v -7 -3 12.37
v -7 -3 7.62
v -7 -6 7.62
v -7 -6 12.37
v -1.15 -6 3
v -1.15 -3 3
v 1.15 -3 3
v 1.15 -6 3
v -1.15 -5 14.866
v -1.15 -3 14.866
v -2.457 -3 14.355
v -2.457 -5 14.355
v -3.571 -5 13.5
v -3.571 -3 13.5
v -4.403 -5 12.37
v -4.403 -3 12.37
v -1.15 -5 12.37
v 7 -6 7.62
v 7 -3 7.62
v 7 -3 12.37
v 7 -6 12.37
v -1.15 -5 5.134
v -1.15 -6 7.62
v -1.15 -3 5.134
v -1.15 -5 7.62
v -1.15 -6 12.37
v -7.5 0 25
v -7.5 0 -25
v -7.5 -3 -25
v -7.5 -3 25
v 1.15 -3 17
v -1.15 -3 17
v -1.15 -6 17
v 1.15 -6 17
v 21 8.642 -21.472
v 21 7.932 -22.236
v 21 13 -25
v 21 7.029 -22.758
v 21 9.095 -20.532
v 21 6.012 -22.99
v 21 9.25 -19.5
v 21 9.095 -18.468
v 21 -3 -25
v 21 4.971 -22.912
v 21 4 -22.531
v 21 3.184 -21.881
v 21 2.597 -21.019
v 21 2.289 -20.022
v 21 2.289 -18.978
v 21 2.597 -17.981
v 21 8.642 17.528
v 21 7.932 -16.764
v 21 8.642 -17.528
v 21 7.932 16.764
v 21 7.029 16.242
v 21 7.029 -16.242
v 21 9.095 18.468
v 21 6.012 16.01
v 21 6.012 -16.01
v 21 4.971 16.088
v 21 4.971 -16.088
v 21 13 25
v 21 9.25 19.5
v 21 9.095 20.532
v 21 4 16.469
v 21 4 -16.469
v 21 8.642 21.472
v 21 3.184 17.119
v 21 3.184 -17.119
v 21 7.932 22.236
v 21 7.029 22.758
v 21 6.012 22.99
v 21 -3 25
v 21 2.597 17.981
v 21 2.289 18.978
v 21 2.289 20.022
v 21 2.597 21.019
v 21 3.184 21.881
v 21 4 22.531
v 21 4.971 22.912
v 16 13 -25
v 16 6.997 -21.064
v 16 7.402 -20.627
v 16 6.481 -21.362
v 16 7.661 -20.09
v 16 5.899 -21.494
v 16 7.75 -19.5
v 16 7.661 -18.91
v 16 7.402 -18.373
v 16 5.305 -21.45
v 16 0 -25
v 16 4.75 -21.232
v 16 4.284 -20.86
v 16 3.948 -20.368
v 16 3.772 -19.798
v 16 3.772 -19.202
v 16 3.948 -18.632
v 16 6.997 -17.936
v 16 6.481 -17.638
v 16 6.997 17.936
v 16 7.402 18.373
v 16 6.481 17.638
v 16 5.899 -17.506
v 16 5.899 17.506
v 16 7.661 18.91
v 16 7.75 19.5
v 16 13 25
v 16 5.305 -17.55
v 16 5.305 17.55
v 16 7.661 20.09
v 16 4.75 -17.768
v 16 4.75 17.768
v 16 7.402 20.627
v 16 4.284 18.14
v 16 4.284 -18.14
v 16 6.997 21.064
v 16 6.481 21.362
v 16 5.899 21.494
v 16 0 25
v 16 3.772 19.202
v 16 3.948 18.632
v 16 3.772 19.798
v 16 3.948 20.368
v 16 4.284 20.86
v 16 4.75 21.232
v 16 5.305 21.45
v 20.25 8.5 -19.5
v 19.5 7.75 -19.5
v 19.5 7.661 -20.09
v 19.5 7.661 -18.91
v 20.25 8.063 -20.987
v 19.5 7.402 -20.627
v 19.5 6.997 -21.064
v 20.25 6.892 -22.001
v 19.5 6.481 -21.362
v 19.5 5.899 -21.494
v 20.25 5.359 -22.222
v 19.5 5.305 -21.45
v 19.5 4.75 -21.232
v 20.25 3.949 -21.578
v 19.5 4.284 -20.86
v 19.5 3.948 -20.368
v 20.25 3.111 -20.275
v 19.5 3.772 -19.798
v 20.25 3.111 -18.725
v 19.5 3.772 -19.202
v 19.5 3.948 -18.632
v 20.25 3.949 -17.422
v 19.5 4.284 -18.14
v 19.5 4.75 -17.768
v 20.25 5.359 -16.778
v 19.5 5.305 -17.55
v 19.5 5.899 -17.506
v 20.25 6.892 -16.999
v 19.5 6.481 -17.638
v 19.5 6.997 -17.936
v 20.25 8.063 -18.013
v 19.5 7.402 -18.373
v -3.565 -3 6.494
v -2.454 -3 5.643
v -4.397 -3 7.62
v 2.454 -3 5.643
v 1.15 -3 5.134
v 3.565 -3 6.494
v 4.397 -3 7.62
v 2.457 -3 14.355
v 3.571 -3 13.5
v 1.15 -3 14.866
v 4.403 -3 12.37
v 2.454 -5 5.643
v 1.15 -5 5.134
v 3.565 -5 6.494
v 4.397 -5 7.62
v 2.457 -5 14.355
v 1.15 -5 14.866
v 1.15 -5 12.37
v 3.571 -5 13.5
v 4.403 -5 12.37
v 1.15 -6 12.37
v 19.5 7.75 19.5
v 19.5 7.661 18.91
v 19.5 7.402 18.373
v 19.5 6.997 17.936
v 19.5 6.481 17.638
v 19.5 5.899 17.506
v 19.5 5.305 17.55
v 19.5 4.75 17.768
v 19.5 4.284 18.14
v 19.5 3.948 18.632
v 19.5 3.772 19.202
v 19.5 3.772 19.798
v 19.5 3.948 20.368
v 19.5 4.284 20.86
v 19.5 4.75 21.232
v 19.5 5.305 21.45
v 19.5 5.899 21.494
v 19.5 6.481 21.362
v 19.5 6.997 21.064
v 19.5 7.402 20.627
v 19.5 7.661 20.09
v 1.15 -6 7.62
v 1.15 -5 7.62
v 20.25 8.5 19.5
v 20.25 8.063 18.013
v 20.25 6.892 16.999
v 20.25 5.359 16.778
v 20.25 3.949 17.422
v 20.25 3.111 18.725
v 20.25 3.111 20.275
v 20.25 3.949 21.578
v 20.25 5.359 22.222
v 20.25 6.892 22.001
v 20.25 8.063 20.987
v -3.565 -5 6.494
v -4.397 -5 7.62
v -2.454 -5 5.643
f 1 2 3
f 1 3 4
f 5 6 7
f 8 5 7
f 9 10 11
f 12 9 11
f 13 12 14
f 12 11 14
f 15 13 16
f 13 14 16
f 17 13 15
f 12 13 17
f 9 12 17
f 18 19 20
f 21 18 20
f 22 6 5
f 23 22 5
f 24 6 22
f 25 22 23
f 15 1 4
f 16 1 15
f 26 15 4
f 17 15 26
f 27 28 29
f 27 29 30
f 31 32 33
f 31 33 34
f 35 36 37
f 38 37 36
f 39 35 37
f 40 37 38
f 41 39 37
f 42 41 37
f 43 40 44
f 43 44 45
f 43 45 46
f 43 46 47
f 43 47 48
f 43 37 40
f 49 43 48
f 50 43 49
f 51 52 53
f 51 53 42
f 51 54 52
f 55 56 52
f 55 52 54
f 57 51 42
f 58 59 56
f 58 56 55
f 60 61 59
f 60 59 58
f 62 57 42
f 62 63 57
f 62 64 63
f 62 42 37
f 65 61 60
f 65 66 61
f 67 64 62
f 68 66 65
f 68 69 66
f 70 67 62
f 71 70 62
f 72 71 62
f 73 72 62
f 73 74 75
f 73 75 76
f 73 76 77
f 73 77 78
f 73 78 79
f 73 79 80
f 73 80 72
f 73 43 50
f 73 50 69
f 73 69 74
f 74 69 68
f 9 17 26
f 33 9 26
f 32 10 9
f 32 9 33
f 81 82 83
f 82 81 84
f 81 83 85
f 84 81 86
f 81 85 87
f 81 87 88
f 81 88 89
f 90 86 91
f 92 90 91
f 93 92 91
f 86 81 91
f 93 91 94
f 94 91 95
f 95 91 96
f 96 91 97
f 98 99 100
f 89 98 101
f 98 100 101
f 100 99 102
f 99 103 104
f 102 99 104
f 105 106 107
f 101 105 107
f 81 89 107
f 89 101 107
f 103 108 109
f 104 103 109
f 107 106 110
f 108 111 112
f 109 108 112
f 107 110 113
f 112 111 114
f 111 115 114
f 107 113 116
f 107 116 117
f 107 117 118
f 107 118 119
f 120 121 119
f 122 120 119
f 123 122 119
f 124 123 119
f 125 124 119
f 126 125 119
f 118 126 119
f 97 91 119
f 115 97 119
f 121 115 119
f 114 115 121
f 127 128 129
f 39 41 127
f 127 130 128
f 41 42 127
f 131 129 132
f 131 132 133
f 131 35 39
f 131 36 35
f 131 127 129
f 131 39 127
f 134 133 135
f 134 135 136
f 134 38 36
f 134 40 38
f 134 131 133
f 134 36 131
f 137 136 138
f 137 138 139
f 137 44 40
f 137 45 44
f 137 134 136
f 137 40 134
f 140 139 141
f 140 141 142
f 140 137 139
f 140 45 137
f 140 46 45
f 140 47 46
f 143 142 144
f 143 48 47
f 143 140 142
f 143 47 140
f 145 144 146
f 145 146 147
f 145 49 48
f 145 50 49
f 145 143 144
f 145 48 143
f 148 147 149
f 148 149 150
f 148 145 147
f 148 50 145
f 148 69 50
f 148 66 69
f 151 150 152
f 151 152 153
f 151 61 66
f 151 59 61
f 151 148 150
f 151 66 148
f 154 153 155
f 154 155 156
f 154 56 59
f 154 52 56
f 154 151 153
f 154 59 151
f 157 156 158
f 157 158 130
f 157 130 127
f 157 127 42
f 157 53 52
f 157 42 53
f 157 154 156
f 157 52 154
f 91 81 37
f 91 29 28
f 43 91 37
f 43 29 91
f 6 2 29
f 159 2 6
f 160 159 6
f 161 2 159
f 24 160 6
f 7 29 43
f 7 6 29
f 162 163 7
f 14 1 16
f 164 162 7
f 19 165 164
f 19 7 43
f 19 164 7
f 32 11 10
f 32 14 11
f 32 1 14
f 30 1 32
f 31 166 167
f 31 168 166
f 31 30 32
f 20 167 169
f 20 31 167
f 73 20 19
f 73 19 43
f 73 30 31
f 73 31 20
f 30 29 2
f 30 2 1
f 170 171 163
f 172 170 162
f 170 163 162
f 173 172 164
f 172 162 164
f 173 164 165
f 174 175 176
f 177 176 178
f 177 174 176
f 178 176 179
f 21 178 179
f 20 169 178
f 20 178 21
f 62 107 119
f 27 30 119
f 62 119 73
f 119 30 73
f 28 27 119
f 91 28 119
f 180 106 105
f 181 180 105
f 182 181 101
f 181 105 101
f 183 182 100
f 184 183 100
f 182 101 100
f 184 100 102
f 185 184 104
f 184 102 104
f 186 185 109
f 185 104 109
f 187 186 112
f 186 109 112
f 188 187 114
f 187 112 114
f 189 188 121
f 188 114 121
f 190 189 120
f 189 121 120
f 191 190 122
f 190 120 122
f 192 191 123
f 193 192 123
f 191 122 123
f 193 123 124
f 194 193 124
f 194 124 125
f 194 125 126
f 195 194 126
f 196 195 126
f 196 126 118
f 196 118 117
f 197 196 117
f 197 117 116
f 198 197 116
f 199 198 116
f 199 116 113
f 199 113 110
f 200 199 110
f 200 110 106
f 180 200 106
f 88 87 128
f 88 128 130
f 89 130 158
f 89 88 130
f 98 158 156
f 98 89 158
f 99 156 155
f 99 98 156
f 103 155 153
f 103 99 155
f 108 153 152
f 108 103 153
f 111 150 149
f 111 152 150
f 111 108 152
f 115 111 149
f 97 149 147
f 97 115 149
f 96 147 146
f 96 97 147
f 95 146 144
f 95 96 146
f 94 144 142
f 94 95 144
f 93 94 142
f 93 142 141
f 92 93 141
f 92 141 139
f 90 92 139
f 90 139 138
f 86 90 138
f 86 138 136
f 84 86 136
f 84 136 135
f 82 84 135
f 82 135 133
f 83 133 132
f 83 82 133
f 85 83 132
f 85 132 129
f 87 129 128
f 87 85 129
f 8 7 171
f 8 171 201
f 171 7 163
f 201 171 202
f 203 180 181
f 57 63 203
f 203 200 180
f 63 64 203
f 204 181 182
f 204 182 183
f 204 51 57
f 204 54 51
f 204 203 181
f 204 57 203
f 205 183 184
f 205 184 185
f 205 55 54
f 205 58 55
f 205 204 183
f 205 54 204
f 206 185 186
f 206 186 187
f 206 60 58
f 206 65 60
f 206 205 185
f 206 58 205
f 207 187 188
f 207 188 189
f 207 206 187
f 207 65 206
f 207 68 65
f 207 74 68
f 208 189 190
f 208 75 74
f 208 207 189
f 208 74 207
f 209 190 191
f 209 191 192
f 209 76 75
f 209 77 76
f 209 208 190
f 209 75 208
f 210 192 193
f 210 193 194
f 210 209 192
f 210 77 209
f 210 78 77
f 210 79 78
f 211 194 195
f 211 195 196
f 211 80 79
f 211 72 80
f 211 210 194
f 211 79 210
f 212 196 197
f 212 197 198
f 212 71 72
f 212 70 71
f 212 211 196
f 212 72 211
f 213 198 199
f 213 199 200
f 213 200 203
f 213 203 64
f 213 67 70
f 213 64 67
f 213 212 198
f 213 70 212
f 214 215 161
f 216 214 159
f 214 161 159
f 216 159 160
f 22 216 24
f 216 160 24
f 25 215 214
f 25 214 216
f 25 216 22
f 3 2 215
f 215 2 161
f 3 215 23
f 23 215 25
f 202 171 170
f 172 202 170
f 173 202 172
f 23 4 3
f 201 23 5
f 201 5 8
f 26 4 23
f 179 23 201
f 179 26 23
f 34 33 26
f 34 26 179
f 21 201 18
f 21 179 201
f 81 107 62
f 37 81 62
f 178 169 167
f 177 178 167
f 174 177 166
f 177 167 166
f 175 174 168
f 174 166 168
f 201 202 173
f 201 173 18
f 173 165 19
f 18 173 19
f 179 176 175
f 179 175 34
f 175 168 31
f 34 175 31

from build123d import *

# Parameters (mm, degrees)
SKETCH020_W       = 2.3
SKETCH020_H       = 14
PAD010_DEPTH      = 3
SKETCH021_W       = 14
SKETCH021_H       = 4.75
PAD011_DEPTH      = 3
SKETCH022_R       = 5
PAD012_DEPTH      = 2
SKETCH023_W       = 28.5
SKETCH023_H       = 50
PAD013_DEPTH      = 3
SKETCH024_W       = 5
SKETCH024_H       = 50
PAD014_DEPTH      = 13
CYLINDER003_R     = 2
CYLINDER003_DEPTH = 15
CHAMFER001_SIZE   = 1.5


with BuildPart() as part:
    # Sketch020 → Pad010 (new body)
    with BuildSketch(Plane.XZ.offset(3)):
        with Locations((0, 10)):
            Rectangle(SKETCH020_W, SKETCH020_H)
    extrude(amount=PAD010_DEPTH)

    # Sketch021 → Pad011 (join)
    with BuildSketch(Plane.XZ.offset(3)):
        with Locations((0, 9.995)):
            Rectangle(SKETCH021_W, SKETCH021_H)
    extrude(amount=PAD011_DEPTH)

    # Sketch022 → Pad012 (join)
    with BuildSketch(Plane.XZ.offset(3)):
        with Locations((0, 10)):
            Circle(SKETCH022_R)
    extrude(amount=PAD012_DEPTH)

    # Sketch023 → Pad013 (join)
    with BuildSketch(Plane.XZ):
        with Locations((6.75, 0)):
            Rectangle(SKETCH023_W, SKETCH023_H)
    extrude(amount=PAD013_DEPTH)

    # Sketch024 → Pad014 (join)
    with BuildSketch(Plane.XZ):
        with Locations((18.5, 0)):
            Rectangle(SKETCH024_W, SKETCH024_H)
    extrude(amount=-PAD014_DEPTH)

    # Cylinder003 → Cylinder003 (cut)
    with BuildSketch(Plane(origin=(10, 5.75, -19.5), x_dir=(0, 1, 0), z_dir=(1, 0, 0))):
        Circle(CYLINDER003_R)
    cylinder003 = extrude(amount=CYLINDER003_DEPTH, mode=Mode.SUBTRACT)

    # Mirrored011: Cylinder003 across XY
    add(cylinder003.mirror(Plane.XY), mode=Mode.SUBTRACT)

    # Chamfer001
    chamfer001_edges = [part.edges().sort_by_distance(p)[0] for p in [
        (21, 3.75, -19.5),
        (21, 3.75, 19.5),
    ]]
    chamfer(chamfer001_edges, length=CHAMFER001_SIZE)


solid = part.part
